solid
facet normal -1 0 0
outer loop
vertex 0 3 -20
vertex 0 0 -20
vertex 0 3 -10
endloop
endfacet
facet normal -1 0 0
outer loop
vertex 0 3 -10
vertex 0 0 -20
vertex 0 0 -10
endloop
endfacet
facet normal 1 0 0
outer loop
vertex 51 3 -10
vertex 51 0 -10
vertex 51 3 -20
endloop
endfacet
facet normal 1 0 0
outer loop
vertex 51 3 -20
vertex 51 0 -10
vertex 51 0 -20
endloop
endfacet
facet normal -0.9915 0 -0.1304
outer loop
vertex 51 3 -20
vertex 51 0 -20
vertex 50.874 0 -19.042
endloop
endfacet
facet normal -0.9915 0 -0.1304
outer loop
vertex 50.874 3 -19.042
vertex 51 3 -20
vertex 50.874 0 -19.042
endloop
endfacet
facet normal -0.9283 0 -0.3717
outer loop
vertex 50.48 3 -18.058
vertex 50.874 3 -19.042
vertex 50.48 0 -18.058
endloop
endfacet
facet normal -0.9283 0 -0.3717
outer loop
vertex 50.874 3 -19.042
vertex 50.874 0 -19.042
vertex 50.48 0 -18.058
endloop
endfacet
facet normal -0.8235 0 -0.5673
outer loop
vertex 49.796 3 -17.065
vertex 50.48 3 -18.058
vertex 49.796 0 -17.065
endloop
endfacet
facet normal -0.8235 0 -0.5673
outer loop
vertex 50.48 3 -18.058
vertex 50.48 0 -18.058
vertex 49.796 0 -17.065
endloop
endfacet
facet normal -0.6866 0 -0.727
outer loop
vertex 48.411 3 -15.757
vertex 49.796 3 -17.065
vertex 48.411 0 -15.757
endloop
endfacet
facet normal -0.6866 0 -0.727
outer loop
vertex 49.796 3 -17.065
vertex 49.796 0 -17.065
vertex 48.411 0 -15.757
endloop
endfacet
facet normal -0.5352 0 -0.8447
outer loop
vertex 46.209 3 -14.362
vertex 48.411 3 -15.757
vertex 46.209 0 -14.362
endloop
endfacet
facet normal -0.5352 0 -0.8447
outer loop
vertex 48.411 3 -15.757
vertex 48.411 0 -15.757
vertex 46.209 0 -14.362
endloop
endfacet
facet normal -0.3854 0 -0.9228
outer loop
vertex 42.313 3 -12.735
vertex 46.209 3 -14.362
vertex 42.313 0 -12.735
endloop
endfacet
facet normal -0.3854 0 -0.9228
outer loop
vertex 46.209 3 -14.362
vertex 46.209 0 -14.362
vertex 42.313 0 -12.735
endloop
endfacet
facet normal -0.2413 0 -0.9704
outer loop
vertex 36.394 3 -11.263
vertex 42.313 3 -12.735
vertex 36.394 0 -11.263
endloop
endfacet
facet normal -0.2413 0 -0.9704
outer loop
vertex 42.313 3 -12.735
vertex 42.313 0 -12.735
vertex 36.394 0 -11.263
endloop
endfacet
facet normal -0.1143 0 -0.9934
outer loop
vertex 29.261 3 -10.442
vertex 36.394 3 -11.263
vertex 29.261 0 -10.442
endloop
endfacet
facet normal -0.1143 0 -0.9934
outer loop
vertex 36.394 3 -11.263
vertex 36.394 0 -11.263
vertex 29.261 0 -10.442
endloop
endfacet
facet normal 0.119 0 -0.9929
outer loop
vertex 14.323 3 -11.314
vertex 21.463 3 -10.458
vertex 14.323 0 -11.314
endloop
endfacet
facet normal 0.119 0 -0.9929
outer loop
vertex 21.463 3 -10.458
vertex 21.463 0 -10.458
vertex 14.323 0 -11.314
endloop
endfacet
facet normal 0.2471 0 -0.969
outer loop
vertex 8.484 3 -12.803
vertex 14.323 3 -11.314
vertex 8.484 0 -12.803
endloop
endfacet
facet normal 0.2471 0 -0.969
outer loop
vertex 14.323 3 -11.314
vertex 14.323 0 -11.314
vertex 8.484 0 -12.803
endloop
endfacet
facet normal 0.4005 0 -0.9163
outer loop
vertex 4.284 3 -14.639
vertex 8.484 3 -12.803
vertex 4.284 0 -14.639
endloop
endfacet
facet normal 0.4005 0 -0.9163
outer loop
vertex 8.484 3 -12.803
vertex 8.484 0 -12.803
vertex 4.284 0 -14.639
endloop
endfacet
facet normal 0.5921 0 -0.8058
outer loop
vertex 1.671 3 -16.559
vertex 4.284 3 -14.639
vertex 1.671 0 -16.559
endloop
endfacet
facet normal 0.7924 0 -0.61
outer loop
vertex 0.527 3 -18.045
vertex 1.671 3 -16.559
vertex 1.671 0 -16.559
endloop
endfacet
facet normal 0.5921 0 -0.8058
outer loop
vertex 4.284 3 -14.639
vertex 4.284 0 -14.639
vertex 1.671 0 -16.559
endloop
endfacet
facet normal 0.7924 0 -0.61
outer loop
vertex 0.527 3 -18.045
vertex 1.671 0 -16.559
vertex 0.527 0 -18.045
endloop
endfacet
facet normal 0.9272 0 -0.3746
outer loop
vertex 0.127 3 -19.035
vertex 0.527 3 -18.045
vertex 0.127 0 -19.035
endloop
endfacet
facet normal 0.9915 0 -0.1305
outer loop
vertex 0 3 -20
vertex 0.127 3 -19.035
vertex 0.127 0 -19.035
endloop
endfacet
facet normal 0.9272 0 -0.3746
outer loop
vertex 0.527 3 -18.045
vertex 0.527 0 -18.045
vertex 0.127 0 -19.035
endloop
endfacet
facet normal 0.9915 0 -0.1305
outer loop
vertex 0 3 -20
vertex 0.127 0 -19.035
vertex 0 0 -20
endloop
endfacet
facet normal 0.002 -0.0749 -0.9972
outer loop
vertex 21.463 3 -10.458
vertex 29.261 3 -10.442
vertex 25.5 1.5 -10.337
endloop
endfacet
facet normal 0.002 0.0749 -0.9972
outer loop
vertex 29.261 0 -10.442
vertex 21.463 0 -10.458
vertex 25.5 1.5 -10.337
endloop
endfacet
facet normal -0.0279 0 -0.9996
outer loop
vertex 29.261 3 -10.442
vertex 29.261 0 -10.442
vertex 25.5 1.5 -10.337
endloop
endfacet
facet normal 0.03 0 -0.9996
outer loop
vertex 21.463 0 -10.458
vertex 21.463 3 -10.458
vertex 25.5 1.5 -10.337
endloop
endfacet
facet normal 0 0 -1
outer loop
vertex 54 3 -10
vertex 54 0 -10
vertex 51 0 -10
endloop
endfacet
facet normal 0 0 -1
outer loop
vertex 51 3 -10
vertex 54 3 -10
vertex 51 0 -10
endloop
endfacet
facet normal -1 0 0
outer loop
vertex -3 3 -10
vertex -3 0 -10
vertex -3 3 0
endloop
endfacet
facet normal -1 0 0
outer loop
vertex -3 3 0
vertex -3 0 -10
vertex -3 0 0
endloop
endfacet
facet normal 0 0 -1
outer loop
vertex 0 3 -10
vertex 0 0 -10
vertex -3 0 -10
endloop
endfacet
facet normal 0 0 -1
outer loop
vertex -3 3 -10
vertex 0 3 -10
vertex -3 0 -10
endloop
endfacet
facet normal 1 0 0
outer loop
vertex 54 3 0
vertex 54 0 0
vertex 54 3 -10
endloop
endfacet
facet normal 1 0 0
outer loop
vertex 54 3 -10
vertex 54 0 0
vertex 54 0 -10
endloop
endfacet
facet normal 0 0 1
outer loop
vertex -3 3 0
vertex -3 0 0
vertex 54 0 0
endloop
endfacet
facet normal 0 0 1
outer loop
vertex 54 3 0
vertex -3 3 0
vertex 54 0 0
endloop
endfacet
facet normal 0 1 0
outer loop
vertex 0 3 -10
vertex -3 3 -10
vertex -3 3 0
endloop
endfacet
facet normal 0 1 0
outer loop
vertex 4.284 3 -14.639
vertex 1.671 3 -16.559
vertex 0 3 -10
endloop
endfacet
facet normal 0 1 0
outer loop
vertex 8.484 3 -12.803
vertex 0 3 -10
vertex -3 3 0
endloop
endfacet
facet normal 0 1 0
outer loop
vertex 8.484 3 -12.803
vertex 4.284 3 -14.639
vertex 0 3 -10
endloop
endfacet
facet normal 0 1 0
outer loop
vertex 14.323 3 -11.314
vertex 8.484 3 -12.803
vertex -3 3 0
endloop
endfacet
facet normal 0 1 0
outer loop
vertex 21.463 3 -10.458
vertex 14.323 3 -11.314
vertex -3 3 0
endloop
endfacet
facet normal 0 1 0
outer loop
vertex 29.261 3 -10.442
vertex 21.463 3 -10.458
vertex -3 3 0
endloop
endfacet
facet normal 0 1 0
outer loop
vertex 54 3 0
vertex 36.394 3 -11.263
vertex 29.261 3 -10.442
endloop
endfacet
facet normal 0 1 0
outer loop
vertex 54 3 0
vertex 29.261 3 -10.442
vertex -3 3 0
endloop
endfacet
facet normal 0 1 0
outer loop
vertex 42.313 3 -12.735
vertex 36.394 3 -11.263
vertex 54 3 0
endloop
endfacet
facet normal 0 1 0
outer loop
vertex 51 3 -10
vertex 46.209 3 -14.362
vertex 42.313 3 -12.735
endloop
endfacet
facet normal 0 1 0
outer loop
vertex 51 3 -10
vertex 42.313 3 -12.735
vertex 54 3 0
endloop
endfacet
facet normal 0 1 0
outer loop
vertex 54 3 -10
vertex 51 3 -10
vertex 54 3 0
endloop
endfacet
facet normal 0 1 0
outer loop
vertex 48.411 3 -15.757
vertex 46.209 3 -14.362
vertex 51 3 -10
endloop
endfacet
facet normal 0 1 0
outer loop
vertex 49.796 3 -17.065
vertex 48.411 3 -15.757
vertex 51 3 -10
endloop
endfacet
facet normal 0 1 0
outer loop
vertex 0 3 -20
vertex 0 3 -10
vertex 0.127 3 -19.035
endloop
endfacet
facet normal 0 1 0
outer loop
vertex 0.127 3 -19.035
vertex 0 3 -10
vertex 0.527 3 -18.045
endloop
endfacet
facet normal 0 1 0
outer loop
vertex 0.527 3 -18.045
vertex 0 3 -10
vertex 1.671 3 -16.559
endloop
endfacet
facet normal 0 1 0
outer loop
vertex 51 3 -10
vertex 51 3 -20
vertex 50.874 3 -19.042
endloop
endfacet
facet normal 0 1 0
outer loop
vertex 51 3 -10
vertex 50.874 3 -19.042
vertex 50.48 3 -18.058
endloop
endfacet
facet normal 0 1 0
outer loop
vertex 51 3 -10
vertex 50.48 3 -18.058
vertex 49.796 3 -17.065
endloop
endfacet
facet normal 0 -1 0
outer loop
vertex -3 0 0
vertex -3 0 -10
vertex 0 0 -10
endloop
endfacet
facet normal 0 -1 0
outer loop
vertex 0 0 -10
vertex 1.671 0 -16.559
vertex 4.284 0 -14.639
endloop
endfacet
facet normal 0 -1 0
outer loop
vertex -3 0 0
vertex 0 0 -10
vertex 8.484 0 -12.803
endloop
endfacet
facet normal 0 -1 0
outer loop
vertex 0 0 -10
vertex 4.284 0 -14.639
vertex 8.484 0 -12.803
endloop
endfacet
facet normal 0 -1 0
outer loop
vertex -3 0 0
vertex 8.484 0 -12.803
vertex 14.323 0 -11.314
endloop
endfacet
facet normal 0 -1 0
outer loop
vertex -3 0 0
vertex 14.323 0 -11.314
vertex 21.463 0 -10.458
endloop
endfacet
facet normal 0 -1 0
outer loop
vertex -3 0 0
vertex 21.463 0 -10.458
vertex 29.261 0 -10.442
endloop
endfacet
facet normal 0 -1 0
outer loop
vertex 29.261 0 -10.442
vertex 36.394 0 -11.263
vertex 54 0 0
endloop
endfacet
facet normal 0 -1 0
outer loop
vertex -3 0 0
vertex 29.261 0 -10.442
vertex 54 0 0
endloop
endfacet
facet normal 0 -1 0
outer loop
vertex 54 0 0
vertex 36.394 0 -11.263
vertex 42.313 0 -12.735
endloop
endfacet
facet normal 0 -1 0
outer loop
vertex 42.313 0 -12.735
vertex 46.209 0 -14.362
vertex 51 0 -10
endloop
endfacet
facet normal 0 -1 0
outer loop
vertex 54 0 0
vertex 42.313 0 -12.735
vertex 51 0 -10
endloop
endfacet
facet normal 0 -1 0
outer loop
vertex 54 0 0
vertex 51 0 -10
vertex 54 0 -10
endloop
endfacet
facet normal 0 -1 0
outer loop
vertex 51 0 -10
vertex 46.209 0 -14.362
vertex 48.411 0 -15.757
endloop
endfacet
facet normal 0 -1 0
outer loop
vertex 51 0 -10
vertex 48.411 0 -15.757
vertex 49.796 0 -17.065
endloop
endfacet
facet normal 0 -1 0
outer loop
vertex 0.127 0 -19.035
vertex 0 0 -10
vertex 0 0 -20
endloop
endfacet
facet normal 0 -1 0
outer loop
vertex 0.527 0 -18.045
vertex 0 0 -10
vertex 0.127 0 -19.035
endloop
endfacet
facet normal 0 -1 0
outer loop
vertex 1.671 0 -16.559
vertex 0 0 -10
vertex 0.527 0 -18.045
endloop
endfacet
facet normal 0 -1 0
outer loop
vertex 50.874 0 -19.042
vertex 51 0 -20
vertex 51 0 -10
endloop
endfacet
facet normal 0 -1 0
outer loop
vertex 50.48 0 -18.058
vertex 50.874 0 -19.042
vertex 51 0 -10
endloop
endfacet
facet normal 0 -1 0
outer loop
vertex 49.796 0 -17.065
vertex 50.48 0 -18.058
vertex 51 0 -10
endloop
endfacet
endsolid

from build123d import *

# Parameters (mm, degrees)
BOSS_EXTRUDE1_DEPTH = 3


with BuildPart() as part:
    # Sketch2 → Boss-Extrude1 (new body)
    with BuildSketch(Plane(origin=(0, 0, 0), x_dir=(1, 0, 0), z_dir=(0, 1, 0))):
        with BuildLine():
            Line((25.5, 0), (25.5, 10.336529865))
            add(Edge.make_bspline(
                [(0, 20), (0, 10.336529865), (25.5, 10.336529865)],
                knots=[3.141592654, 3.141592654, 3.141592654, 4.71238898, 4.71238898, 4.71238898], degree=2, weights=[1, 0.707106781, 1]))
            Line((0, 20), (0, 10))
            Line((0, 10), (-3, 10))
            Line((-3, 10), (-3, 0))
            Line((-3, 0), (0, 0))
            Line((0, 0), (25.5, 0))
        make_face()
        with BuildLine():
            add(Edge.make_bspline(
                [(25.5, 10.336529865), (51, 10.336529865), (51, 20)],
                knots=[4.71238898, 4.71238898, 4.71238898, 6.283185307, 6.283185307, 6.283185307], degree=2, weights=[1, 0.707106781, 1]))
            Line((25.5, 10.336529865), (25.5, 0))
            Line((25.5, 0), (51, 0))
            Line((51, 0), (54, 0))
            Line((54, 0), (54, 10))
            Line((54, 10), (51, 10))
            Line((51, 10), (51, 20))
        make_face()
    extrude(amount=BOSS_EXTRUDE1_DEPTH)


solid = part.part
